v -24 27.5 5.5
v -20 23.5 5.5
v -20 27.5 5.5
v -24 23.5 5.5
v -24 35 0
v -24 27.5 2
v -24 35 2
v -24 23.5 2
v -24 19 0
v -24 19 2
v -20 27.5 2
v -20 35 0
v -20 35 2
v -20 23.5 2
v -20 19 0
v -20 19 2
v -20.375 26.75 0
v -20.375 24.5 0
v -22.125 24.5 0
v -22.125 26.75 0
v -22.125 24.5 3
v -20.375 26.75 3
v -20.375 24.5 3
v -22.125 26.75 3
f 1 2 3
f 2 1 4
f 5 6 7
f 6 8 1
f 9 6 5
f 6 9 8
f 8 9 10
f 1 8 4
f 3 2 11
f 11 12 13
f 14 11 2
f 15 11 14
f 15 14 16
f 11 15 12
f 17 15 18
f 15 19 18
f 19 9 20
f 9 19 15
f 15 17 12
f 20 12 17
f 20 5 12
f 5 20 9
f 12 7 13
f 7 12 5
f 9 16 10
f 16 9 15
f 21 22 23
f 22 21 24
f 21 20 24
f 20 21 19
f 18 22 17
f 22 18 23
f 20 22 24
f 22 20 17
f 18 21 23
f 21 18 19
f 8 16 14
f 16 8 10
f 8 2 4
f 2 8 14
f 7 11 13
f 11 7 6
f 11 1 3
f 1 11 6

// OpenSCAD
render_base = false;
render_cover = false;
render_battery = false;
render_switch = true;

wall = 2.0;
width = 36.8; //37.6;
height = 6; //16;
length = 80.5; //82.8;

deviation = 0.5;
//$fn=20;
//$fs = 0.15;
$fn=60;
$fs = 0.01;

module cover(width, length, height, wall, deviation) {    
    difference() {
        union() {
            difference() {
                //cube([width + (2 * wall), length + (2 * wall), height + wall]);
                roundedcube([width + (2 * wall), length + (2 * wall), height + wall], false, .8, "zmin");
                translate([wall, wall, wall]) {
                    cube([width, length, height + 0.1]);
                }                
            }
            //snap fit bottom     
            translate([0, 0, height+wall]) {
                difference() {
                    //cube([width+(2*wall), length+(2*wall), 2]);
                    roundedcube([width+(2*wall), length+(2*wall), 2], false, .8, "z");
                    translate([1, 1, 0])
                        cube([width+(wall), length+(wall), 2]);
                }
            }            

            //display shroud
            shr_ht = 4.7;
            translate([13, 11, 1]) {
                cube([1,27,shr_ht]);
                cube([16,1,shr_ht]);
            }
            translate([28, 11, 1])
                cube([1,27,shr_ht]);
            translate([13, 37, 1])
                cube([16,1,shr_ht]);

        }
        
        //display opening
        translate([14, 12, 0]) {
            //cube([14,25,2]);
            roundedcube([14,25,2], false, 1.5, "z");
        }
        
        //power switch hole
        translate([0, wall+44.5, wall+7.5]) {
            cube([5,8,5]);
        }
              
        //SW1 Button Notch
        translate([0, wall+4, wall+5.5]) {
            cube([6,6,6],2.5,2.5);
        }
        //SW2 Button Notch
        translate([0, wall+14, wall+5.5]) {
            cube([6,6,6],2.5,2.5);
        }
        //SW3 Button Notch
        translate([0, wall+24, wall+5.5]) {
            cube([6,6,6],2.5,2.5);
        }
        //SW4 Button Notch
        translate([0, wall+34, wall+5.5]) {
            cube([6,6,6],2.5,2.5);
        }

        //serial port hole
        translate([wall+2.75, length, 2.5]) {
            cube(size=[32, 10, 10]);
        }
        
        //usb port
        translate([width+(wall*2)-14-8.8, 0, wall + 1.5])
            cube([14, 4, 8]);

        linear_extrude(.5) {
            translate([39,76,8]) //Retro
                rotate([0,0,0])
                    mirror([-1,0,0])
                        text("Retro", size=8, font="Retronoid:style=Italic");
            translate([35,67,8]) //Disks
                rotate([0,0,0])
                    mirror([-1,0,0])
                        text("D", size=8, font="Retronoid:style=Italic");
            translate([28,67,8]) //Disks
                rotate([0,0,0])
                    mirror([-1,0,0])
                        text("isks", size=8, font="Retronoid:style=Italic");
            
            translate([39.4,67,6]) //WiRSa
                rotate([0,0,0])
                    mirror([-1,0,0])
                        text("_________", size=5, font="Courier New:style=bold");


                translate([35,57,6]) //WiRSa
                    mirror([-1,0,0])
                        text("WiRSa", size=7, font="Courier New:style=bold");
            

                translate([11,wall+5,6]) //up
                        mirror([-1,0,0])
                            text("8", size=8, font="Webdings:style=bold");

                translate([11,wall+15,6]) //select
                        mirror([-1,0,0])
                            text("=", size=7.5, font="Webdings:style=bold");

                translate([11,wall+25,6])  //back
                        mirror([-1,0,0])
                            text("5", size=7.5, font="Webdings:style=bold");
                            
                translate([11,wall+35,6]) //down
                        mirror([-1,0,0])
                            text("7", size=8, font="Webdings:style=bold");
        }
        
    }
}


module base(width, length, height, wall, deviation) {
    difference() {
        union() {
            difference() {
                //cube([width + (2 * wall), length + (2 * wall), height + wall]);
                roundedcube([width + (2 * wall), length + (2 * wall), height + wall], false, .8, "zmin");
                translate([wall, wall, wall]) {
                    cube([width, length, height + 0.1]);
                }
                if (render_battery) {
                    cube([1,length+(wall*2),2]);
                    cube([width+(wall*2),1,2]);
                    translate([width+wall+1, 0, 0])
                        cube([1,length+(wall*2),2]);
                    translate([0,length+wall+1, 0])
                        cube([width+(wall*2),1,2]);
                    
                }
            }
            
            //snap fit top
            translate([1, 1, height+wall]) {
                difference() {
                    cube([width+wall, length+wall, 2]);
                translate([1, 1, 0])
                    cube([width, length, 2]);
                }
            }
        }
        
        if (render_battery) {
            //plug opening
            translate([width-6, 59, 0]) {
                cube([8,12,4]);
            } 
        }
        
        //sd card hole
        translate([0, wall+55, wall+2.5]) {
            cube([4,14,3.5]);
        }
        
        //power switch hole
        translate([width, wall+44.5, wall+3.5]) {
            cube([5,8,5]);
        }
        
        //SW1 Button Notch
        translate([width, wall+4, wall+4.5]) {
            cube([6,6,6],2.5,2.5);
        }
        //SW2 Button Notch
        translate([width, wall+14, wall+4.5]) {
            cube([6,6,6],2.5,2.5);
        }
        //SW3 Button Notch
        translate([width, wall+24, wall+4.5]) {
            cube([6,6,6],2.5,2.5);
        }
        //SW4 Button Notch
        translate([width, wall+34, wall+4.5]) {
            cube([6,6,6],2.5,2.5);
        }

        //serial port hole
        translate([wall+2.75, length, 3]) {
            cube(size=[32, 10, 10]);
        }
    }
}


module battery(width, length, height, wall, deviation) {
    
    difference() {
        union() {
            difference() {
                //cube([width + (2 * wall), length + (2 * wall), height + wall]);
                roundedcube([width + (2 * wall), length + (2 * wall), height + wall], false, .8, "zmin");
                translate([wall, wall, wall]) {
                    cube([width, length, height + 0.1]);
                }
            }
            //snap fit bottom     
            translate([0, 0, height+wall]) {
                difference() {
                    //cube([width+(2*wall), length+(2*wall), 2]);
                    roundedcube([width+(2*wall), length+(2*wall), 2], false, .8, "z");
                    translate([1, 1, 0])
                        cube([width+(wall), length+(wall), 2]);
                }
            }
        }
    }
}


module switch_cover() {
    difference() {
        cube([5.5,16,4]);
        
        translate([0,5.5,0.375])
            cube([3,2.25,1.75]);
        translate([2,0,0])
            cube([5,4.5,5]);
        translate([2,8.5,0])
            cube([5,8,5]);
    }
}

rot = 0;

if (render_base)
    base(width, length, height, wall, deviation);

if (render_cover)
    translate([-width-5,0,0])
        cover(width, length, height+1.5, wall, deviation);

if (render_battery)
    translate([width+5, length+5, 0])
        rotate([0,0,90])
            battery(width, length, height+3.75, wall, deviation);

if (render_switch)
    translate([-20, 19, 0])
        rotate([0,270,0])
            switch_cover();

module roundedcube(size = [1, 1, 1], center = false, radius = 0.5, apply_to = "all") {
	// If single value, convert to [x, y, z] vector
	size = (size[0] == undef) ? [size, size, size] : size;

	translate_min = radius;
	translate_xmax = size[0] - radius;
	translate_ymax = size[1] - radius;
	translate_zmax = size[2] - radius;

	diameter = radius * 2;

	obj_translate = (center == false) ?
		[0, 0, 0] : [
			-(size[0] / 2),
			-(size[1] / 2),
			-(size[2] / 2)
		];

	translate(v = obj_translate) {
		hull() {
			for (translate_x = [translate_min, translate_xmax]) {
				x_at = (translate_x == translate_min) ? "min" : "max";
				for (translate_y = [translate_min, translate_ymax]) {
					y_at = (translate_y == translate_min) ? "min" : "max";
					for (translate_z = [translate_min, translate_zmax]) {
						z_at = (translate_z == translate_min) ? "min" : "max";

						translate(v = [translate_x, translate_y, translate_z])
						if (
							(apply_to == "all") ||
							(apply_to == "xmin" && x_at == "min") || (apply_to == "xmax" && x_at == "max") ||
							(apply_to == "ymin" && y_at == "min") || (apply_to == "ymax" && y_at == "max") ||
							(apply_to == "zmin" && z_at == "min") || (apply_to == "zmax" && z_at == "max")
						) {
							sphere(r = radius);
						} else {
							rotate = 
								(apply_to == "xmin" || apply_to == "xmax" || apply_to == "x") ? [0, 90, 0] : (
								(apply_to == "ymin" || apply_to == "ymax" || apply_to == "y") ? [90, 90, 0] :
								[0, 0, 0]
							);
							rotate(a = rotate)
							cylinder(h = diameter, r = radius, center = true);
						}
					}
				}
			}
		}
	}
}

render();
